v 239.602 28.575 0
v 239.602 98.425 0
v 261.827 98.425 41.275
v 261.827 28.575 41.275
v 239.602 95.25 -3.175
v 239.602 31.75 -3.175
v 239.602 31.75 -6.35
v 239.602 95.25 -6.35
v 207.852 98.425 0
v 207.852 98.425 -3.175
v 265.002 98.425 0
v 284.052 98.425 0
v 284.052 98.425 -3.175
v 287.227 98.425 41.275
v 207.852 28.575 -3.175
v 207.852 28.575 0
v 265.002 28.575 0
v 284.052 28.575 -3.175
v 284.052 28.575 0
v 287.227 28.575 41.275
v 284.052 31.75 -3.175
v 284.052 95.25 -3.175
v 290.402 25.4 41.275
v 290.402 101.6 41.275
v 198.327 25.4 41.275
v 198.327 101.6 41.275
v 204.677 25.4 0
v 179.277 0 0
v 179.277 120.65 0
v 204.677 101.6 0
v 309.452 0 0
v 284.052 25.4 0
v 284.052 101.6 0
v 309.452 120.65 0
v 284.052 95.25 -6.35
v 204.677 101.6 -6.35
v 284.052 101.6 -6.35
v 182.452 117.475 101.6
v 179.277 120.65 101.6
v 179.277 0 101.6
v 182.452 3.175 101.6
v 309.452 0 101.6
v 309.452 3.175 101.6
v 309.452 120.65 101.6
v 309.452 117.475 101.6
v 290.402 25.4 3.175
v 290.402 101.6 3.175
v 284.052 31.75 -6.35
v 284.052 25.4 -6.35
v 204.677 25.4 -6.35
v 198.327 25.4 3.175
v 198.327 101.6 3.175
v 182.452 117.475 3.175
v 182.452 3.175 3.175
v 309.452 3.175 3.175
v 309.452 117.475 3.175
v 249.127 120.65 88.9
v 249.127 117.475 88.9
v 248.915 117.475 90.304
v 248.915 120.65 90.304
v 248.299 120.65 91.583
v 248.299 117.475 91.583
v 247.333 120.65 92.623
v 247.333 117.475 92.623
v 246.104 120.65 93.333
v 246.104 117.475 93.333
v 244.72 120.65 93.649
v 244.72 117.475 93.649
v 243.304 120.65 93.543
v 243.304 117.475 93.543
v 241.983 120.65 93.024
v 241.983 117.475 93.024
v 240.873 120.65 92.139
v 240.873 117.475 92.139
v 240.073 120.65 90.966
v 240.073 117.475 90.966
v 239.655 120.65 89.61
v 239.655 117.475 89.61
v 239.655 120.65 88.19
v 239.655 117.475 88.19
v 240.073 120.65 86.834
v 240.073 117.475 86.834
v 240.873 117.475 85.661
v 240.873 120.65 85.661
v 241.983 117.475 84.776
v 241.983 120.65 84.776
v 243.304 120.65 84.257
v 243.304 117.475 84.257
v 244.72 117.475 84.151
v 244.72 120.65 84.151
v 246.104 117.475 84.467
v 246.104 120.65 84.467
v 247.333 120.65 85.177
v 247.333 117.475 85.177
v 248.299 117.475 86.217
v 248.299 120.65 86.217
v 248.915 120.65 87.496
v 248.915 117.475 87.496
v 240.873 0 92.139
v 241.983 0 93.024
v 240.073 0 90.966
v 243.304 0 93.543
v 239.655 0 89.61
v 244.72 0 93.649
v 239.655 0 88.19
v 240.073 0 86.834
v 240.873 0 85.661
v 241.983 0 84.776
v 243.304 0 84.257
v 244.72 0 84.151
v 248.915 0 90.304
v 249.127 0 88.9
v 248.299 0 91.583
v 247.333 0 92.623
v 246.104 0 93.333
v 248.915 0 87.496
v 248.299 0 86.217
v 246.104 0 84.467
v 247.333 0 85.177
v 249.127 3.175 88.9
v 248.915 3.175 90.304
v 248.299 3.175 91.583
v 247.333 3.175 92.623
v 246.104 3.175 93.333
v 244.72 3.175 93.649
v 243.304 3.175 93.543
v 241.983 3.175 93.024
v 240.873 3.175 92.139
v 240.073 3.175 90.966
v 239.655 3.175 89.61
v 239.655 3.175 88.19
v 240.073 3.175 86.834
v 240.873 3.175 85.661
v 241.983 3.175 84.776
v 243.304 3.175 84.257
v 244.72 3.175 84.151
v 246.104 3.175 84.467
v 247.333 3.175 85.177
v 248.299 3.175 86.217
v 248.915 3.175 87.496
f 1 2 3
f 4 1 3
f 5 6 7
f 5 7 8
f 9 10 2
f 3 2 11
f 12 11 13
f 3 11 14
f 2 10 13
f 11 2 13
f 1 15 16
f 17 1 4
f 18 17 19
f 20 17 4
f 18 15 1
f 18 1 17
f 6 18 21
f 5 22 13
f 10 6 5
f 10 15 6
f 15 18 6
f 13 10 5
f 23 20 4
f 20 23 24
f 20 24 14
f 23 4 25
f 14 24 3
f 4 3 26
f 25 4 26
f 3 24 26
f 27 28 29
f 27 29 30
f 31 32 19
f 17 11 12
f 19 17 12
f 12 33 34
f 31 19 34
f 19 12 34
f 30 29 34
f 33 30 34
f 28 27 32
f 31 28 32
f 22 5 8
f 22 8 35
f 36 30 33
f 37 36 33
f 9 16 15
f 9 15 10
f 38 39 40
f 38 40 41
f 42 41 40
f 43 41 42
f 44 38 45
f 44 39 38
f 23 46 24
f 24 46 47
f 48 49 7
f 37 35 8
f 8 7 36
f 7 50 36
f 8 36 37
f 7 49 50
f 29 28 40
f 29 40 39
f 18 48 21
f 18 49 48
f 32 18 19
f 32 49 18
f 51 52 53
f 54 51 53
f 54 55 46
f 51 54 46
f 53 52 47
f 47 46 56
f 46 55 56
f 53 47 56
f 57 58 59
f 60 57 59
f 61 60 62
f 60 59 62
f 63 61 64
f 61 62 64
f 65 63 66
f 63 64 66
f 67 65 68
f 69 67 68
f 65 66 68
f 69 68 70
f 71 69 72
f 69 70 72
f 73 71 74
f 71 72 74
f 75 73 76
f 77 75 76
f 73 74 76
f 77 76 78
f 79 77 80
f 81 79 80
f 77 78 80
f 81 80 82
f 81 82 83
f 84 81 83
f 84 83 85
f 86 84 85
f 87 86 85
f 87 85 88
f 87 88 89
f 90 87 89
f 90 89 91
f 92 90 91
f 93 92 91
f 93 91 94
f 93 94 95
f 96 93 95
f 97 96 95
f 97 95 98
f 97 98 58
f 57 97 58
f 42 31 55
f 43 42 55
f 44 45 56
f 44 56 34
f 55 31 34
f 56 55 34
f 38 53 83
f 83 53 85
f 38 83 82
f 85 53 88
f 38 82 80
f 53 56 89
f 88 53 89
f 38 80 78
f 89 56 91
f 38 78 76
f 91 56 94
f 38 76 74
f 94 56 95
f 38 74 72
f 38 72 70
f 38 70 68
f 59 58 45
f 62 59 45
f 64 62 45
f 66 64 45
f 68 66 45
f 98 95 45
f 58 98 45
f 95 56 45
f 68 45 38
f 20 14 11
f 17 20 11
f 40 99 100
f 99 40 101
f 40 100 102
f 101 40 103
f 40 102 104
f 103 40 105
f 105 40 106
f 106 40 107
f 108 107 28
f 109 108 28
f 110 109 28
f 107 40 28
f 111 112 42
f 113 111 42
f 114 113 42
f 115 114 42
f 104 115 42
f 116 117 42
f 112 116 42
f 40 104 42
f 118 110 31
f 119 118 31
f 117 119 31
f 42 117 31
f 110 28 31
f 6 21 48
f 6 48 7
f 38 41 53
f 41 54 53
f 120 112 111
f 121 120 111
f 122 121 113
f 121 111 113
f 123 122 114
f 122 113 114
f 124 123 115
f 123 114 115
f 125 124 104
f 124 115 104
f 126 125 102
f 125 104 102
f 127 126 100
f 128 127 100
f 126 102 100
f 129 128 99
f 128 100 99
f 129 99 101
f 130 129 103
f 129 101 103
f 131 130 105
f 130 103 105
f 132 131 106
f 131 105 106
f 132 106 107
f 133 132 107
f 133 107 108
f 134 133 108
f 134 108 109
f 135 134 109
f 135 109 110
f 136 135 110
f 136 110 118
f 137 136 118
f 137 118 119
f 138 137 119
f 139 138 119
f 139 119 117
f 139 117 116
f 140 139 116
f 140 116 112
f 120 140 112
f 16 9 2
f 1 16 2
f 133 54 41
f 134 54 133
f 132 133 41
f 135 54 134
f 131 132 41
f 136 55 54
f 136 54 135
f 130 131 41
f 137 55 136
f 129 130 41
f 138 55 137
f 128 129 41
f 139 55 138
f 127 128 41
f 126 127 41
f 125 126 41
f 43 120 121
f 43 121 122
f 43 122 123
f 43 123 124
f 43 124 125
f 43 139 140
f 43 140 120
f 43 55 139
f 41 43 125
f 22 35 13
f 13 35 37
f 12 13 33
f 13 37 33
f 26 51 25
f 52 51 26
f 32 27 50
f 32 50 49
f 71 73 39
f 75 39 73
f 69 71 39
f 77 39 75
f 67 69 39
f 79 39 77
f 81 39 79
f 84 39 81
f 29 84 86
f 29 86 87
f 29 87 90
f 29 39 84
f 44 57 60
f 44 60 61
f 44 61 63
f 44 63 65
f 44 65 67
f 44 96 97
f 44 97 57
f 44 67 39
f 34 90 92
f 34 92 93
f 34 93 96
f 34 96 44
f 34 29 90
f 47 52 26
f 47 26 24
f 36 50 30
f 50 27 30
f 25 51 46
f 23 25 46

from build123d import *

# Parameters (mm, degrees)
F0_W      = 130.175
F0_H      = 120.65
F1_DEPTH  = 101.6
F2_T      = -3.175
F3_W      = 85.725
F3_H      = 69.85
F4_DEPTH  = 25.4
F5_W      = 92.075
F5_H      = 76.2
F5_W_2    = 85.725
F5_H_2    = 69.85
F6_DEPTH  = 38.1
F7_W      = 79.375
F7_H      = 3.175
F8_DEPTH  = 6.35
F9_W      = 79.375
F9_H      = 3.175
F10_DEPTH = 6.35
F11_W     = 79.375
F11_H     = 3.175
F12_DEPTH = 3.175
F13_W     = 79.375
F13_H     = 3.175
F14_DEPTH = 3.175
F15_W     = 114.3
F15_H     = 95.25
F16_DEPTH = 6.35
F17_W     = 114.3
F17_H     = 3.175
F18_DEPTH = 16.764
F20_DEPTH = 69.85
F22_DEPTH = 69.85
F23_R     = 4.7625
F24_DEPTH = 148.082
F25_W     = 3.175
F25_H     = 3.175
F26_DEPTH = 69.85
F27_DEPTH = 3.175
F28_W     = 63.5
F28_H     = 3.175
F29_DEPTH = 31.75


with BuildPart() as f1:
    # F0 (on Top) → F1 (new body)
    with BuildSketch(Plane.XY):
        with Locations((244.3640923992, 60.325)):
            Rectangle(F0_W, F0_H)
    extrude(amount=F1_DEPTH)

    # F2
    f2_openings = [f1.faces().sort_by_distance(p)[0] for p in [
        (244.364092, 60.325, 101.6),
    ]]
    offset(amount=F2_T, openings=f2_openings)

    # F3 (on face) → F4 (cut)
    with BuildSketch(Plane.XY.offset(3.175)):
        with Locations((244.3640923992, 63.5)):
            Rectangle(F3_W, F3_H)
    extrude(amount=-F4_DEPTH, mode=Mode.SUBTRACT)

    # F5 (on face) → F6 (join)
    with BuildSketch(Plane.XY.offset(3.175)):
        with Locations((244.3640923992, 63.5)):
            Rectangle(F5_W, F5_H)
        with Locations((244.3640923992, 63.5)):
            Rectangle(F5_W_2, F5_H_2, mode=Mode.SUBTRACT)
    extrude(amount=F6_DEPTH)

    # F7 (on face) → F8 (join)
    with BuildSketch(Plane(origin=(0, 0, 0), x_dir=(1, 0, 0), z_dir=(0, 0, -1))):
        with Locations((244.3640923992, -26.9875)):
            Rectangle(F7_W, F7_H)
    extrude(amount=F8_DEPTH)

    # F9 (on face) → F10 (join)
    with BuildSketch(Plane(origin=(0, 0, 0), x_dir=(1, 0, 0), z_dir=(0, 0, -1))):
        with Locations((244.3640923992, -100.0125)):
            Rectangle(F9_W, F9_H)
    extrude(amount=F10_DEPTH)

    # F11 (on face) → F12 (join)
    with BuildSketch(Plane.XZ.offset(-98.425)):
        with Locations((244.3640923992, -4.7625)):
            Rectangle(F11_W, F11_H)
    extrude(amount=F12_DEPTH)

    # F13 (on face) → F14 (join)
    with BuildSketch(Plane(origin=(0, 28.575, 0), x_dir=(-1, 0, 0), z_dir=(0, 1, 0))):
        with Locations((-244.3640923992, -4.7625)):
            Rectangle(F13_W, F13_H)
    extrude(amount=F14_DEPTH)

    # F15 (on face) → F16 (cut)
    with BuildSketch(Plane.YZ.offset(309.4515923992)):
        with Locations((60.325, 50.8)):
            Rectangle(F15_W, F15_H)
    extrude(amount=-F16_DEPTH, mode=Mode.SUBTRACT)

    # F17 (on face) → F18 (cut)
    with BuildSketch(Plane.YZ.offset(309.4515923992)):
        with Locations((60.325, 100.0125)):
            Rectangle(F17_W, F17_H)
    extrude(amount=-F18_DEPTH, mode=Mode.SUBTRACT)

    # F19 (on face) → F20 (join)
    with BuildSketch(Plane.XZ.offset(-98.425)):
        Polygon((265.0015923992, 0), (284.0515923992, 0), (287.2265923992, 0), (287.2265923992, 41.275), align=None)
    extrude(amount=F20_DEPTH)

    # F21 (on face) → F22 (join)
    with BuildSketch(Plane.XZ.offset(-98.425)):
        Polygon((201.5015923992, 0), (204.6765923992, 0), (239.6015923992, 0), (261.8265923992, 41.275), (201.5015923992, 41.275), align=None)
    extrude(amount=F22_DEPTH)

    # F23 (on face) → F24 (cut)
    with BuildSketch(Plane.XZ):
        with Locations((244.3640923992, 88.9)):
            Circle(F23_R)
    extrude(amount=-F24_DEPTH, mode=Mode.SUBTRACT)

    # F25 (on face) → F26 (join)
    with BuildSketch(Plane(origin=(0, 28.575, 0), x_dir=(-1, 0, 0), z_dir=(0, 1, 0))):
        with Locations((-206.2640923992, -1.5875)):
            Rectangle(F25_W, F25_H)
    extrude(amount=F26_DEPTH)

    # F27 (add): a face of the model
    f27_faces = [f1.faces().sort_by_distance(p)[0] for p in [
        (206.2640923992, 63.5, -3.175),
    ]]
    extrude(f27_faces, amount=F27_DEPTH)

    # F28 (on face) → F29 (join)
    with BuildSketch(Plane.YZ.offset(207.8515923992)):
        with Locations((63.5, -4.7625)):
            Rectangle(F28_W, F28_H)
    extrude(amount=F29_DEPTH)


solid = f1.part
